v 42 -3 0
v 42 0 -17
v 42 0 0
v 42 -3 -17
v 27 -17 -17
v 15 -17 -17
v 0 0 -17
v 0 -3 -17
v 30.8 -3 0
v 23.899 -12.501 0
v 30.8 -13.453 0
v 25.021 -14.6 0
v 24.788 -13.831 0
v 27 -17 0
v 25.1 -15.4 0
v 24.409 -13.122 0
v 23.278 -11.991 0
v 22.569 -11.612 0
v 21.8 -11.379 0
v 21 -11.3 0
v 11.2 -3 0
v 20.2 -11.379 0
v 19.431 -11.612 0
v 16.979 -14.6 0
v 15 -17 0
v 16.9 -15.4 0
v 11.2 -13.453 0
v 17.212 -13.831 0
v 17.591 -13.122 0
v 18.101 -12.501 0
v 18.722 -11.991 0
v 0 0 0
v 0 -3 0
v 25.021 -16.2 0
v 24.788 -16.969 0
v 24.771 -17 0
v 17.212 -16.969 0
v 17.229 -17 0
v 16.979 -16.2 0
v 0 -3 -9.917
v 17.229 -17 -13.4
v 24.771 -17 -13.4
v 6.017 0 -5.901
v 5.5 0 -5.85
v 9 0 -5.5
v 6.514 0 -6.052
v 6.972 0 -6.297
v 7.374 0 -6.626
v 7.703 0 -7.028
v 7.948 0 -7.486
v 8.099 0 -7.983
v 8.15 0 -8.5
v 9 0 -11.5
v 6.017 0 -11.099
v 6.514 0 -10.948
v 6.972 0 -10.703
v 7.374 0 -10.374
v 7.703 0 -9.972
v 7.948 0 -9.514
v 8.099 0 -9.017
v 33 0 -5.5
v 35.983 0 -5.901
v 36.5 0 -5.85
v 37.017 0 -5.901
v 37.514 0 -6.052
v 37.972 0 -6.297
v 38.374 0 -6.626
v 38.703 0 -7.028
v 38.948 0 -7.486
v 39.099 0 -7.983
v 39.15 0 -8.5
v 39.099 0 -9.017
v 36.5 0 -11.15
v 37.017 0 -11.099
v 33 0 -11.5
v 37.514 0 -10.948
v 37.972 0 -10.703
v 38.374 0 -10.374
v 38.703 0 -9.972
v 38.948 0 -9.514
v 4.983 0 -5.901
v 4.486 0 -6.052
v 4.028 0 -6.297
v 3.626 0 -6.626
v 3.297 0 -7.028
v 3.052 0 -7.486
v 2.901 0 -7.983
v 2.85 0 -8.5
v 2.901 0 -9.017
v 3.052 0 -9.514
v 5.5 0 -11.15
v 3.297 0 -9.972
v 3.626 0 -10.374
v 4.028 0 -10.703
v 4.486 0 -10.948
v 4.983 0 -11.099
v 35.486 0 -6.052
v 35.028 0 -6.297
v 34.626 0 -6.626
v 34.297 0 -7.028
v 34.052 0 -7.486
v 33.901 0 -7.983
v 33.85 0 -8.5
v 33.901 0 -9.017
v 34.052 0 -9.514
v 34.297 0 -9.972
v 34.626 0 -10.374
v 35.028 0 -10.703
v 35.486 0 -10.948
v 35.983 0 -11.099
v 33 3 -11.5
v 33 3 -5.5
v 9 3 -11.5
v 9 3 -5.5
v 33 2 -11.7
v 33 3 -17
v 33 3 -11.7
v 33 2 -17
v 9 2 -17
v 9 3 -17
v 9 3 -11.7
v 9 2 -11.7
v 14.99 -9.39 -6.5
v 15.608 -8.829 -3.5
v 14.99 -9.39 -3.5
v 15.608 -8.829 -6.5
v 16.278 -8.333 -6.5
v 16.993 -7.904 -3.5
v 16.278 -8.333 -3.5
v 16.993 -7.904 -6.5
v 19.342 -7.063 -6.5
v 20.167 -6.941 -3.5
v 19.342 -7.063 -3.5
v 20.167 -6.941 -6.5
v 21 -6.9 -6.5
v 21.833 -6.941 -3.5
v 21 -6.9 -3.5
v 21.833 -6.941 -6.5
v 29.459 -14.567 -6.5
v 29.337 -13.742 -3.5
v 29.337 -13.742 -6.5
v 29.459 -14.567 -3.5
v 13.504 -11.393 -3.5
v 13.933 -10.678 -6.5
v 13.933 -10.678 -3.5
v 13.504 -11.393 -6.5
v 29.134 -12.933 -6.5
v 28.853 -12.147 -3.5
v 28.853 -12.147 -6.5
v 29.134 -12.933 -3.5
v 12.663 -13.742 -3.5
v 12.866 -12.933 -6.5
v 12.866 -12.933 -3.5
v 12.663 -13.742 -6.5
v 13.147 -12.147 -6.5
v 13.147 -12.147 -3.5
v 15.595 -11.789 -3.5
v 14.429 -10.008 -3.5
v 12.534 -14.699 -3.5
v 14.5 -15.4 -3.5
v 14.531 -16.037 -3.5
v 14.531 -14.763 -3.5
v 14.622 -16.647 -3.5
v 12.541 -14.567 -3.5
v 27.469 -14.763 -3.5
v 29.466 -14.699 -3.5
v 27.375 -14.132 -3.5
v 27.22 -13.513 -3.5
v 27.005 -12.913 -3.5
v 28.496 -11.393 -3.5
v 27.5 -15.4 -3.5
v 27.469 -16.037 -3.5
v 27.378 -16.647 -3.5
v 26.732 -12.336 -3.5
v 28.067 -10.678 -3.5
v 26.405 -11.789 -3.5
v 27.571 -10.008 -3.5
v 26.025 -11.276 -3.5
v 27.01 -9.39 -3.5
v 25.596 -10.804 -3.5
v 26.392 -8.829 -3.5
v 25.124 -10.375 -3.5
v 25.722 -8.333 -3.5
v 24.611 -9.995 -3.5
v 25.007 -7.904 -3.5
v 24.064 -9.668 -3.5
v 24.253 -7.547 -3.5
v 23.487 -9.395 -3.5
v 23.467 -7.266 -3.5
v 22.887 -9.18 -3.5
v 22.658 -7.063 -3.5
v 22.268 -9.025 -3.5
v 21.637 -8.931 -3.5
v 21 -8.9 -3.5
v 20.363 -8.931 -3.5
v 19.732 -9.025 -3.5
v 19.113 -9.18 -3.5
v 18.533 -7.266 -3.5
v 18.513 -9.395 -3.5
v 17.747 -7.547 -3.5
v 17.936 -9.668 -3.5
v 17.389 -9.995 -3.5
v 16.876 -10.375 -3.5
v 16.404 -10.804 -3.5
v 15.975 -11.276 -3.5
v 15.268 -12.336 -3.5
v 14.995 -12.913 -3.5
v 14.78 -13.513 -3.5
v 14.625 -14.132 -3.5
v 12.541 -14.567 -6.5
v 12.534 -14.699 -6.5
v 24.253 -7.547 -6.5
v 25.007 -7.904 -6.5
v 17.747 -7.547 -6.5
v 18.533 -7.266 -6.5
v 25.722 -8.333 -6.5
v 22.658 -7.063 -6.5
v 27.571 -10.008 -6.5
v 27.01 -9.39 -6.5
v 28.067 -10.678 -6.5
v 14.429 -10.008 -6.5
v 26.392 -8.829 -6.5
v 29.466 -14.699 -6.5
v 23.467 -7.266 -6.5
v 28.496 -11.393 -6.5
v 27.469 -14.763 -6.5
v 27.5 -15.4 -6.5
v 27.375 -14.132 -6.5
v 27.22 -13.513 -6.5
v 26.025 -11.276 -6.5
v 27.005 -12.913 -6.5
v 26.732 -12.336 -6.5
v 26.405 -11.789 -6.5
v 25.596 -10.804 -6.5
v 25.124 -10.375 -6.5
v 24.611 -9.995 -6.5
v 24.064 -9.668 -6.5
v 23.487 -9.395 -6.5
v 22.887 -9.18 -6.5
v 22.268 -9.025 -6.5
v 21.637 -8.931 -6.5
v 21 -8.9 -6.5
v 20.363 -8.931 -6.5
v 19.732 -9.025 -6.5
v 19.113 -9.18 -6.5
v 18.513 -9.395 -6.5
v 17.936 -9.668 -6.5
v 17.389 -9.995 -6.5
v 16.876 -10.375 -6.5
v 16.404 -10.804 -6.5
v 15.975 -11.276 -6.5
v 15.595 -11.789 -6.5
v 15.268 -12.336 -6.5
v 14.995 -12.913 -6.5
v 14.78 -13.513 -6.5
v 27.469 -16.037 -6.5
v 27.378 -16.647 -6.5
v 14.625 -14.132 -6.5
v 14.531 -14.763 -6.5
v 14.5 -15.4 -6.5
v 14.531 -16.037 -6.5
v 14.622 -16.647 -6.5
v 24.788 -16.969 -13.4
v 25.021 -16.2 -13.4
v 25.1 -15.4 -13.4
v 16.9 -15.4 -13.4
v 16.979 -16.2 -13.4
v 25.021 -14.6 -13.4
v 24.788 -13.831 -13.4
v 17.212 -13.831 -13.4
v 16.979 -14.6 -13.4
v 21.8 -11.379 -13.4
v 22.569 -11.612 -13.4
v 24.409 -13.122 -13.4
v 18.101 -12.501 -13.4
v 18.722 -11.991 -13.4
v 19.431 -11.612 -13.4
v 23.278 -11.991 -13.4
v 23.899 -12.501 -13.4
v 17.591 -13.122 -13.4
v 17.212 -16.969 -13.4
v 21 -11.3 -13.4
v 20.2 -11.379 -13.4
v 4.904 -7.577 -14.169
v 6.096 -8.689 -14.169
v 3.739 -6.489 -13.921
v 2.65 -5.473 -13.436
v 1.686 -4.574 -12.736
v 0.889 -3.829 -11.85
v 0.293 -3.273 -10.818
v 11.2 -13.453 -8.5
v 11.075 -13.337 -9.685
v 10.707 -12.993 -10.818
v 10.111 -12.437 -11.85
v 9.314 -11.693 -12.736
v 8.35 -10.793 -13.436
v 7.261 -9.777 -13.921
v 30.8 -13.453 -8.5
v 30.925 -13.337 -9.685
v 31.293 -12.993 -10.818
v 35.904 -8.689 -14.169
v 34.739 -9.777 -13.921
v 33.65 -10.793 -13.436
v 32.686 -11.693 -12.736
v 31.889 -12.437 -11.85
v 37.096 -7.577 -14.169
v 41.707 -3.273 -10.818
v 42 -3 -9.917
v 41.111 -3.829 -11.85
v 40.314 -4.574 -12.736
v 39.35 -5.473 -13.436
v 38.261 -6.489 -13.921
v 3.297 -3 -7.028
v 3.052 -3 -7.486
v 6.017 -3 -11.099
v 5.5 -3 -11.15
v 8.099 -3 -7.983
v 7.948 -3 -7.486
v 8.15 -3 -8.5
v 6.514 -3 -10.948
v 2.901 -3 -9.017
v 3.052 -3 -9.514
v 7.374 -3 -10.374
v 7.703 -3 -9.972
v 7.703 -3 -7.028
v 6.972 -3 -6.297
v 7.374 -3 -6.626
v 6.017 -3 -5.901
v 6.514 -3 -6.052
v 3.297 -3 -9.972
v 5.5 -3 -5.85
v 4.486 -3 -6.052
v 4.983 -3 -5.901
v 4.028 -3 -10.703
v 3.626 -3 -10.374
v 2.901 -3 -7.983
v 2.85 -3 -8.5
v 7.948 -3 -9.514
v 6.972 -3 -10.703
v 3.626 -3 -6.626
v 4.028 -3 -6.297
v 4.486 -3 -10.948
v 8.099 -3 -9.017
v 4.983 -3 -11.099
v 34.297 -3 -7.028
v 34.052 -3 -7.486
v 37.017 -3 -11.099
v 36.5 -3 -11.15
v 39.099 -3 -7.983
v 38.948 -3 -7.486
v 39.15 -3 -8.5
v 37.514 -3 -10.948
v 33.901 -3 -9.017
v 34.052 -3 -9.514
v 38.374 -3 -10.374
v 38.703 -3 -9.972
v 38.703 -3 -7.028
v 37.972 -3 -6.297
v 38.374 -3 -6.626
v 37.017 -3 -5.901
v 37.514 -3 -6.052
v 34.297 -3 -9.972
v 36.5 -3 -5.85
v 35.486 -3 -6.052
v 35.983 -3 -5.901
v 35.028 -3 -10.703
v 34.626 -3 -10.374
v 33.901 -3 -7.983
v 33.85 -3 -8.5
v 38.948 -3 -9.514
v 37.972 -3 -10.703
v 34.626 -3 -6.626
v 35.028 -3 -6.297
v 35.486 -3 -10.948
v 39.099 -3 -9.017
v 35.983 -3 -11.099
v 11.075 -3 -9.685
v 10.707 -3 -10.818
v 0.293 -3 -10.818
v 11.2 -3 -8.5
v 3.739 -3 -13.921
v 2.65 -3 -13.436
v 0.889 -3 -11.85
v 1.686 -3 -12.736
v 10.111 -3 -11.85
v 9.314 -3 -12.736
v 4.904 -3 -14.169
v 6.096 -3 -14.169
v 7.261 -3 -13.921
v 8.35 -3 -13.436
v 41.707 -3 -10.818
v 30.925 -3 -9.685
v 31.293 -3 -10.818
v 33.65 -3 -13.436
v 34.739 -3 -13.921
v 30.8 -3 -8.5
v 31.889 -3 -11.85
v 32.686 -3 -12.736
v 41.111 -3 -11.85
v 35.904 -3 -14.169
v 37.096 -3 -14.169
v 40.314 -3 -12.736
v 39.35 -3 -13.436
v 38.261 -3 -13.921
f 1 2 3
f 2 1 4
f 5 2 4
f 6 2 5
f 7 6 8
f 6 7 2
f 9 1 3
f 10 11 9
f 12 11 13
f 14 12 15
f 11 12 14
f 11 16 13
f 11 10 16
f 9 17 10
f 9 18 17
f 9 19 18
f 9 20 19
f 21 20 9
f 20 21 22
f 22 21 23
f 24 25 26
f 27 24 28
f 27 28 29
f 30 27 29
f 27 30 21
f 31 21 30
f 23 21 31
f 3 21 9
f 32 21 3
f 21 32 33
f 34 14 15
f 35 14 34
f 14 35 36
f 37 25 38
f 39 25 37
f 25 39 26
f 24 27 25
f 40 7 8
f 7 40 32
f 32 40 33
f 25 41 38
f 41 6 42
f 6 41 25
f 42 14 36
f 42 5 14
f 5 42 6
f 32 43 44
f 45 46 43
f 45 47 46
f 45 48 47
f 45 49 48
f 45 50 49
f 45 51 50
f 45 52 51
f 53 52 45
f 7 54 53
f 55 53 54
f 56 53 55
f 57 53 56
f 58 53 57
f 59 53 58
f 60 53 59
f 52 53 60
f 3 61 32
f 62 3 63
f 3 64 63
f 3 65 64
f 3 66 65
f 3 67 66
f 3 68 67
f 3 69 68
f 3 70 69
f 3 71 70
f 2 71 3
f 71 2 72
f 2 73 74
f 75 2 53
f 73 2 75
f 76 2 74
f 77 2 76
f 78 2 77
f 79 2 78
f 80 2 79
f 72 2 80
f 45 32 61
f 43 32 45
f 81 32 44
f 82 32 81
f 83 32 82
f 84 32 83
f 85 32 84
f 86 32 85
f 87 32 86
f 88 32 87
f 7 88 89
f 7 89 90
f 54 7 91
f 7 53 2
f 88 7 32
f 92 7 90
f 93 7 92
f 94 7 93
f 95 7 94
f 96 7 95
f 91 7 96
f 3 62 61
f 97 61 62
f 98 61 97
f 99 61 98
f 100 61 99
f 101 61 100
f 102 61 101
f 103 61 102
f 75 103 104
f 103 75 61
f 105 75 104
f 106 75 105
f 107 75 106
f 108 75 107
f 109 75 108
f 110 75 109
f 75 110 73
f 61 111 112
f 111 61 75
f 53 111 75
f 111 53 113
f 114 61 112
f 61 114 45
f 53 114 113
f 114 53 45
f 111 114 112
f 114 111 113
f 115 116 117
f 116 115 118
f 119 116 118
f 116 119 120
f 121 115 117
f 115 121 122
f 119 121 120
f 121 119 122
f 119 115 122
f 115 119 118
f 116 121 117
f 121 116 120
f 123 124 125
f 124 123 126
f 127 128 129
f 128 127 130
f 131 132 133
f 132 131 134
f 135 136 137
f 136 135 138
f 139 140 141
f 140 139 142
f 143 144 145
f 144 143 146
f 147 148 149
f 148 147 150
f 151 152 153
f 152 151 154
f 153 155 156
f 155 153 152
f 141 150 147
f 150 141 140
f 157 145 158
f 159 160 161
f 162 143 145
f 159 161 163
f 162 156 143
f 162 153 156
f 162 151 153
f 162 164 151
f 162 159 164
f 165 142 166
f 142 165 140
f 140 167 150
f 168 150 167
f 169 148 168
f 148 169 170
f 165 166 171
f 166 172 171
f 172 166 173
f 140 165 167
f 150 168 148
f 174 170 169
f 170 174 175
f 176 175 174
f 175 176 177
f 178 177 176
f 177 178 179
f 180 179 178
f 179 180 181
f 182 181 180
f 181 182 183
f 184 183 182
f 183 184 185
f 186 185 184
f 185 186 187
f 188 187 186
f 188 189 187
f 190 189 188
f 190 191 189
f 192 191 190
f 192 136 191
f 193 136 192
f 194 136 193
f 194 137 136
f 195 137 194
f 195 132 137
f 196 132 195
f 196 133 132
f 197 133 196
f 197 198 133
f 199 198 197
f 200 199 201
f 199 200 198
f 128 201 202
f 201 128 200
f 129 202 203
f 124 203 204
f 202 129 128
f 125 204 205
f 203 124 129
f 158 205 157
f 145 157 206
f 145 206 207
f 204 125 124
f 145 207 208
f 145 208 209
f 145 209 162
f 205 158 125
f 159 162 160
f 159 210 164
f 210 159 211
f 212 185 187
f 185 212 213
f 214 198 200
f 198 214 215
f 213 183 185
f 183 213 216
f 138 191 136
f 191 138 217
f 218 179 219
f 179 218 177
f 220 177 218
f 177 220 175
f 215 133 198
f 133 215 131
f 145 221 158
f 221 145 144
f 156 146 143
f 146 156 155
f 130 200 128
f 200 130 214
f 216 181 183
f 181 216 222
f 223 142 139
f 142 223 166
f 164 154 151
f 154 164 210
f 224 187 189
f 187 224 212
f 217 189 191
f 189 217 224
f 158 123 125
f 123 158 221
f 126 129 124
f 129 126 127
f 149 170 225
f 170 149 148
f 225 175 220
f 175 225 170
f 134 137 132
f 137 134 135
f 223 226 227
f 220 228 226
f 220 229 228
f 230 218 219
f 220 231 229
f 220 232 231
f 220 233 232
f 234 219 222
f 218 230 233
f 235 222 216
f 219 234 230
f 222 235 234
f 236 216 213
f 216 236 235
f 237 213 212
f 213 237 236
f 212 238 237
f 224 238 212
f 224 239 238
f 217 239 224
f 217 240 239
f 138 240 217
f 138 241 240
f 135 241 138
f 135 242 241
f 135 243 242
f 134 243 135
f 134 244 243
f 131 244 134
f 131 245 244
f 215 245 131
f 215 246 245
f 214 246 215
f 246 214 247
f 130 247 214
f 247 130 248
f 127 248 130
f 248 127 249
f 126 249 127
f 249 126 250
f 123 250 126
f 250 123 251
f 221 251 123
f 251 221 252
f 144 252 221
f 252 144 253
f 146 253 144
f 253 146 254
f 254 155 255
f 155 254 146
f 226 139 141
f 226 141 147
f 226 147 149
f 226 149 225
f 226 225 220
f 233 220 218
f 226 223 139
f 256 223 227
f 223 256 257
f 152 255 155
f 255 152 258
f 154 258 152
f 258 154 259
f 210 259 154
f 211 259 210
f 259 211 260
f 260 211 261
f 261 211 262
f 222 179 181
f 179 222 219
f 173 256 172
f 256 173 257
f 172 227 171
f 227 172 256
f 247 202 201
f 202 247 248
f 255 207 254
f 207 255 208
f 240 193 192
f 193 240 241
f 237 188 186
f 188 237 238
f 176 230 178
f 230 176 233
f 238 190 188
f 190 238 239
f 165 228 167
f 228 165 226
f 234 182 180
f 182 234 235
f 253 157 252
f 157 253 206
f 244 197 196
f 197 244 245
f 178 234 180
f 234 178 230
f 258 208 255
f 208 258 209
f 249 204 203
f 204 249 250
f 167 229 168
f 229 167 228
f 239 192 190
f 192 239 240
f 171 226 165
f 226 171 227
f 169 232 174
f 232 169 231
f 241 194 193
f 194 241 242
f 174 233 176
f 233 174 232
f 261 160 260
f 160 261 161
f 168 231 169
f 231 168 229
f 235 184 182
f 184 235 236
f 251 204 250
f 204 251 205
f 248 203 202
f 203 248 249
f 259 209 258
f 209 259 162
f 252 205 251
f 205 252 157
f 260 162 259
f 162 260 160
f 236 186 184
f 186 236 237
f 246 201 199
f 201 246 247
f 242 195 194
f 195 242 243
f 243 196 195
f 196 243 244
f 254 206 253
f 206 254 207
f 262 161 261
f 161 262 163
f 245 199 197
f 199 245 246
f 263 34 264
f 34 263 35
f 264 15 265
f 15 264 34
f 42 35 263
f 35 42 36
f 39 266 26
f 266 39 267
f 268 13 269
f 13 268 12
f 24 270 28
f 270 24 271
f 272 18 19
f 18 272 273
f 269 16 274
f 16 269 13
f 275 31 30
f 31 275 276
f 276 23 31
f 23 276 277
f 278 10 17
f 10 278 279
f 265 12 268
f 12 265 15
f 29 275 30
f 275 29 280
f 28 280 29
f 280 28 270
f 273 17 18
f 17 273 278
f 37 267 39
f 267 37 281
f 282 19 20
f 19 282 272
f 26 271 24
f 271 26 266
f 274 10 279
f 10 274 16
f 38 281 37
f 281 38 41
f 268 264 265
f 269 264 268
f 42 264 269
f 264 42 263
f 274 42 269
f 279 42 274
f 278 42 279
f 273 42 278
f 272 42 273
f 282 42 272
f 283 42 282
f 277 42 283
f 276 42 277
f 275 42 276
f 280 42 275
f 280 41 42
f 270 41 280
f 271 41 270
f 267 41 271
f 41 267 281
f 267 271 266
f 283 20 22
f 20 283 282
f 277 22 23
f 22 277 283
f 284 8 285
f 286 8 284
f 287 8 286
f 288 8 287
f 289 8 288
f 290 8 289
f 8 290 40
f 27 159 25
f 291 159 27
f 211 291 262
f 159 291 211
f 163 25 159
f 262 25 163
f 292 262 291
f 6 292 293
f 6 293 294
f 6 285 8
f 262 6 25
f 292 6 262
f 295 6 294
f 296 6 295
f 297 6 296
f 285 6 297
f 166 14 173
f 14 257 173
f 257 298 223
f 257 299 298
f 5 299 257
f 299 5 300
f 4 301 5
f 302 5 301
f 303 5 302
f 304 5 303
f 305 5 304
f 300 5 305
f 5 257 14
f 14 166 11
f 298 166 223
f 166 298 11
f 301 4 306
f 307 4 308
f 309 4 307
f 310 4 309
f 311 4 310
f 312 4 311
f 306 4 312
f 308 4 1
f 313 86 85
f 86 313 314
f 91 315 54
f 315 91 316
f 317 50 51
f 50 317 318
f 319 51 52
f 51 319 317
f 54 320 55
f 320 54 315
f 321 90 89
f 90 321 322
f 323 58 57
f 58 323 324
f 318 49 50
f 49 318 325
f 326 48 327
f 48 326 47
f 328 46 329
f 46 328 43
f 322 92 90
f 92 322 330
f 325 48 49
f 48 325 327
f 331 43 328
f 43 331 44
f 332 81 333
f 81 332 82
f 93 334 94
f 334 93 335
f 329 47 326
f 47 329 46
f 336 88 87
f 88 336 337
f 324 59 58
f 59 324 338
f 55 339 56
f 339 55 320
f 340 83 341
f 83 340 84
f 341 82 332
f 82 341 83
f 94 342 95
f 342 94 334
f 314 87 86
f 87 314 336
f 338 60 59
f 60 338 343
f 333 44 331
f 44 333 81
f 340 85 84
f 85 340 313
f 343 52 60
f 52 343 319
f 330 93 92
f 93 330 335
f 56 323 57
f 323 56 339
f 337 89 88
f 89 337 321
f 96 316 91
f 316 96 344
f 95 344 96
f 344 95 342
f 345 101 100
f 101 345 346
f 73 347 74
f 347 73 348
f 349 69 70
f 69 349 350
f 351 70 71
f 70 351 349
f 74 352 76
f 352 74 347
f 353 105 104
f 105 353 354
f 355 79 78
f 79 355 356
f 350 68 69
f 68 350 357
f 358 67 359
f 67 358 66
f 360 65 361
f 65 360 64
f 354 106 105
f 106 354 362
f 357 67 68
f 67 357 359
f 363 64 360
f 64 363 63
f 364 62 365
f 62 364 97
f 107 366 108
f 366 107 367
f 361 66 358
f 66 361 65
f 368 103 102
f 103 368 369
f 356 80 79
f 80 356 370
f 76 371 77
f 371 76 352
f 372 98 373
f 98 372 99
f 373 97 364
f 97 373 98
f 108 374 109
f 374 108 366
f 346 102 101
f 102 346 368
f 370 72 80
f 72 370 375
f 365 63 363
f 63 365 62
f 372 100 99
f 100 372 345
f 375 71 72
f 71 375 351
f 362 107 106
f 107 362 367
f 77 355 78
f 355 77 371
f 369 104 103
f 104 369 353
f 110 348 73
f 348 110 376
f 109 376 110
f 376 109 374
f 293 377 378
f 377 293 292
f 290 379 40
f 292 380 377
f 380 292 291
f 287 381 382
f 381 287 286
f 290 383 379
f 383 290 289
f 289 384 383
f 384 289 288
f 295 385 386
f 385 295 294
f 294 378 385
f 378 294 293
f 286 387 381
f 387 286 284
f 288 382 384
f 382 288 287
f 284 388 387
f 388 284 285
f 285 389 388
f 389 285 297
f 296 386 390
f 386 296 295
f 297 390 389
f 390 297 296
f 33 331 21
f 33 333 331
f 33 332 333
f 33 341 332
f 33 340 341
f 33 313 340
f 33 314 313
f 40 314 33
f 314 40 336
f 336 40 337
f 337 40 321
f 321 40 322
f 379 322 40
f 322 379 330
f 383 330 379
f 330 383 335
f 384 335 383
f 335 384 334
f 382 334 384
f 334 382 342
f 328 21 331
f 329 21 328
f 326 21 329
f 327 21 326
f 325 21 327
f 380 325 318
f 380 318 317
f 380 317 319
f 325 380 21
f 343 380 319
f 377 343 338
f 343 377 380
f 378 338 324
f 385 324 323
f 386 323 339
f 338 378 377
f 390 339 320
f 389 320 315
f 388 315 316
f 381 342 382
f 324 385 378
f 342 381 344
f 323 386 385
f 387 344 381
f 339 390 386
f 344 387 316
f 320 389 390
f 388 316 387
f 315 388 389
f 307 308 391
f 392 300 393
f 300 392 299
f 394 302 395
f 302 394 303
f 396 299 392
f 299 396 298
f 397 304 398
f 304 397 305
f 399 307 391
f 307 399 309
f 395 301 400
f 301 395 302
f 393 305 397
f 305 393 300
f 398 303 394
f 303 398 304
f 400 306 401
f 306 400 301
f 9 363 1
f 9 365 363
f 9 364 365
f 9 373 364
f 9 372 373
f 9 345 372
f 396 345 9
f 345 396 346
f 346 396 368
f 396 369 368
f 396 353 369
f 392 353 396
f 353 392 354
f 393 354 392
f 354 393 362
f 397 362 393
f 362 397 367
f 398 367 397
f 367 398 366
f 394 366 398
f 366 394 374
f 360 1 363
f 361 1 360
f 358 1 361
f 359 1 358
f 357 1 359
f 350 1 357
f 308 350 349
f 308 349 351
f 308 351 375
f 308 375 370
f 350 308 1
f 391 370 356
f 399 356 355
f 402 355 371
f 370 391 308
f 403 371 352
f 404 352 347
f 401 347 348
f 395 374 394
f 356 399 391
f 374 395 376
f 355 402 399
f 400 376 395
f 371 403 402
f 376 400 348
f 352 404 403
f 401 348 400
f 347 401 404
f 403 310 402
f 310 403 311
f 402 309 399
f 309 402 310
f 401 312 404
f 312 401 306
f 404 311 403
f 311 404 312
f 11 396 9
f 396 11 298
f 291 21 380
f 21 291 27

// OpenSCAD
// RebeliX
//
// y-rod-holder
// GNU GPL v3
// Martin Neruda <neruda@reprap4u.cz>
// http://www.reprap4u.cz
// Modified by Andras Biro

/* [Screw] */

//Diameter of the screw head. 1mm additional spacing recommended
screw_head_diameter = 11.4;
//Diameter of the screw hole. 0.2 - 0.5mm additional spacing recommended
screw_diameter = 5.3;
//Width of the hammer nut. 1mm additional spacing recommended
hammer_nut_width = 7;
//Distance of screw hole center from the edge
holes_from_edge = 5.5;

/* [Base shape] */

width = 42;
height = 17;
base_thickness = 3;
thickness = 17;
rod_diameter = 8;
//Distance of the zip tie from the middle
zip_tie_offset = 3;

/* [Extrusion profile settings] */
//Width of the notch in the extrusion
slot_width = 6;
//Depth of the plastic that goes to the extrusion
slot_depth = 3;
//Enable or disable the support for the plastic that goes to the extrusion
with_support = 1; //[1:Enable, 0:Disable]
//Distance between the support and the part. Recommended to use the print layer height
support_distance = 0.2;

module y_rod_holder_base(){
  //base shape
  cube([width,thickness,height]);
  //notch to the extrusion
  notch_width = width-2*(holes_from_edge+hammer_nut_width/2);
  translate([width/2,0,height/2]) cube([notch_width,slot_depth*2,slot_width],center=true);
  //support
  if ( with_support ) {
    support_height = (height-slot_width)/2-support_distance;
    translate([width/2-notch_width/2,-slot_depth,height-support_height]) cube([notch_width,1,support_height]);
  }
}

module y_cuts(){
  // rod slot
  translate([width/2,thickness - 1.6,-0.1]) cylinder(h=(height/2)+5,r=(rod_diameter/2)+0.1,$fn = 32);
  // cut triangles from the sides
  cut_triangle_adj = (width-rod_diameter)/2-2;
  cut_triangle_opp = thickness-base_thickness;
  cut_triangle_hyp=sqrt(pow(cut_triangle_adj,2)+pow(cut_triangle_opp,2));
  angle = atan2(cut_triangle_opp,cut_triangle_adj);
  translate([0,base_thickness,0]) rotate([0,0,angle]) cube([cut_triangle_hyp,20,height]);
  translate([width-cut_triangle_adj,thickness,0]) rotate([0,0,-angle]) cube([cut_triangle_hyp,20,height]);

  //screw holes
  translate([holes_from_edge,0,height/2]) rotate([-90,0,0]) cylinder(h=40,r=screw_diameter/2,$fn = 32,center=true);
  translate([width-holes_from_edge,0,height/2]) rotate([-90,0,0]) cylinder(h=40,r=screw_diameter/2,$fn = 32,center=true);
  //deepen for screw heads
  translate([holes_from_edge,base_thickness,height/2]) rotate([-90,0,0]) cylinder(r = screw_head_diameter/2, h = 20, $fn = 30);
  translate([width-holes_from_edge,base_thickness,height/2]) rotate([-90,0,0]) cylinder(r = screw_head_diameter/2, h = 20, $fn = 30);
 
  //extend screw head deepening towards the printer
  translate([width-holes_from_edge-screw_head_diameter/2,base_thickness,0]) cube([screw_head_diameter,20,height/2]);
  translate([holes_from_edge-screw_head_diameter/2,base_thickness,0]) cube([screw_head_diameter,20,height/2]);
  
  // zip tie
  translate([width/2,thickness - 1.6,height/2 - zip_tie_offset - 2]) difference(){
    cylinder(r=rod_diameter/2+4.5,h=3,$fn=64);
    cylinder(r=rod_diameter/2+2.5,h=3.1,$fn=64);
  }
}

rotate([180,0,0]) 
difference(){
	y_rod_holder_base();
	y_cuts();
}	
